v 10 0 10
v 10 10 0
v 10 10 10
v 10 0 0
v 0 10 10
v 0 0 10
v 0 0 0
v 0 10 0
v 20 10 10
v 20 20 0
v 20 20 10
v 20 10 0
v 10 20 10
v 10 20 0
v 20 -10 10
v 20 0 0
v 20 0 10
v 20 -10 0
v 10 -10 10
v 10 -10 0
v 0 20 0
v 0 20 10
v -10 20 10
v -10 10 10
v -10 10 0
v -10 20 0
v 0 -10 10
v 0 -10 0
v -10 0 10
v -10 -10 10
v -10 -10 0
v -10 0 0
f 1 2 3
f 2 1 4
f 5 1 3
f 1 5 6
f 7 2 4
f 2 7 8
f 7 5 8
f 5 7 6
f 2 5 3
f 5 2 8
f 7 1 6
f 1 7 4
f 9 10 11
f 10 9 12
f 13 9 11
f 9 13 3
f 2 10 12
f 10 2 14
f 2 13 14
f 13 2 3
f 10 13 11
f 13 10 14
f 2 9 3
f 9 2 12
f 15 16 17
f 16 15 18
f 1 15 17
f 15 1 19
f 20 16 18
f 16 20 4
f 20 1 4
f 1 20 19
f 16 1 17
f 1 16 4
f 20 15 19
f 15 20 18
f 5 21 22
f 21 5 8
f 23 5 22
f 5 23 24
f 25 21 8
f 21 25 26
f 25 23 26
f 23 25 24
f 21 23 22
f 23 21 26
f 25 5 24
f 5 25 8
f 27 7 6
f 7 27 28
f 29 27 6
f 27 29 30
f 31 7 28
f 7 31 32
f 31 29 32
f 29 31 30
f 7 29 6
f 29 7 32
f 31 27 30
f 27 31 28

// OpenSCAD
size = 10;

cube(size);
translate([size, size, 0])
	cube(size);
translate([size, -size,0])
	cube(size);
translate([-size, size, 0])
	cube(size);
translate([-size, -size, 0])
	cube(size);
